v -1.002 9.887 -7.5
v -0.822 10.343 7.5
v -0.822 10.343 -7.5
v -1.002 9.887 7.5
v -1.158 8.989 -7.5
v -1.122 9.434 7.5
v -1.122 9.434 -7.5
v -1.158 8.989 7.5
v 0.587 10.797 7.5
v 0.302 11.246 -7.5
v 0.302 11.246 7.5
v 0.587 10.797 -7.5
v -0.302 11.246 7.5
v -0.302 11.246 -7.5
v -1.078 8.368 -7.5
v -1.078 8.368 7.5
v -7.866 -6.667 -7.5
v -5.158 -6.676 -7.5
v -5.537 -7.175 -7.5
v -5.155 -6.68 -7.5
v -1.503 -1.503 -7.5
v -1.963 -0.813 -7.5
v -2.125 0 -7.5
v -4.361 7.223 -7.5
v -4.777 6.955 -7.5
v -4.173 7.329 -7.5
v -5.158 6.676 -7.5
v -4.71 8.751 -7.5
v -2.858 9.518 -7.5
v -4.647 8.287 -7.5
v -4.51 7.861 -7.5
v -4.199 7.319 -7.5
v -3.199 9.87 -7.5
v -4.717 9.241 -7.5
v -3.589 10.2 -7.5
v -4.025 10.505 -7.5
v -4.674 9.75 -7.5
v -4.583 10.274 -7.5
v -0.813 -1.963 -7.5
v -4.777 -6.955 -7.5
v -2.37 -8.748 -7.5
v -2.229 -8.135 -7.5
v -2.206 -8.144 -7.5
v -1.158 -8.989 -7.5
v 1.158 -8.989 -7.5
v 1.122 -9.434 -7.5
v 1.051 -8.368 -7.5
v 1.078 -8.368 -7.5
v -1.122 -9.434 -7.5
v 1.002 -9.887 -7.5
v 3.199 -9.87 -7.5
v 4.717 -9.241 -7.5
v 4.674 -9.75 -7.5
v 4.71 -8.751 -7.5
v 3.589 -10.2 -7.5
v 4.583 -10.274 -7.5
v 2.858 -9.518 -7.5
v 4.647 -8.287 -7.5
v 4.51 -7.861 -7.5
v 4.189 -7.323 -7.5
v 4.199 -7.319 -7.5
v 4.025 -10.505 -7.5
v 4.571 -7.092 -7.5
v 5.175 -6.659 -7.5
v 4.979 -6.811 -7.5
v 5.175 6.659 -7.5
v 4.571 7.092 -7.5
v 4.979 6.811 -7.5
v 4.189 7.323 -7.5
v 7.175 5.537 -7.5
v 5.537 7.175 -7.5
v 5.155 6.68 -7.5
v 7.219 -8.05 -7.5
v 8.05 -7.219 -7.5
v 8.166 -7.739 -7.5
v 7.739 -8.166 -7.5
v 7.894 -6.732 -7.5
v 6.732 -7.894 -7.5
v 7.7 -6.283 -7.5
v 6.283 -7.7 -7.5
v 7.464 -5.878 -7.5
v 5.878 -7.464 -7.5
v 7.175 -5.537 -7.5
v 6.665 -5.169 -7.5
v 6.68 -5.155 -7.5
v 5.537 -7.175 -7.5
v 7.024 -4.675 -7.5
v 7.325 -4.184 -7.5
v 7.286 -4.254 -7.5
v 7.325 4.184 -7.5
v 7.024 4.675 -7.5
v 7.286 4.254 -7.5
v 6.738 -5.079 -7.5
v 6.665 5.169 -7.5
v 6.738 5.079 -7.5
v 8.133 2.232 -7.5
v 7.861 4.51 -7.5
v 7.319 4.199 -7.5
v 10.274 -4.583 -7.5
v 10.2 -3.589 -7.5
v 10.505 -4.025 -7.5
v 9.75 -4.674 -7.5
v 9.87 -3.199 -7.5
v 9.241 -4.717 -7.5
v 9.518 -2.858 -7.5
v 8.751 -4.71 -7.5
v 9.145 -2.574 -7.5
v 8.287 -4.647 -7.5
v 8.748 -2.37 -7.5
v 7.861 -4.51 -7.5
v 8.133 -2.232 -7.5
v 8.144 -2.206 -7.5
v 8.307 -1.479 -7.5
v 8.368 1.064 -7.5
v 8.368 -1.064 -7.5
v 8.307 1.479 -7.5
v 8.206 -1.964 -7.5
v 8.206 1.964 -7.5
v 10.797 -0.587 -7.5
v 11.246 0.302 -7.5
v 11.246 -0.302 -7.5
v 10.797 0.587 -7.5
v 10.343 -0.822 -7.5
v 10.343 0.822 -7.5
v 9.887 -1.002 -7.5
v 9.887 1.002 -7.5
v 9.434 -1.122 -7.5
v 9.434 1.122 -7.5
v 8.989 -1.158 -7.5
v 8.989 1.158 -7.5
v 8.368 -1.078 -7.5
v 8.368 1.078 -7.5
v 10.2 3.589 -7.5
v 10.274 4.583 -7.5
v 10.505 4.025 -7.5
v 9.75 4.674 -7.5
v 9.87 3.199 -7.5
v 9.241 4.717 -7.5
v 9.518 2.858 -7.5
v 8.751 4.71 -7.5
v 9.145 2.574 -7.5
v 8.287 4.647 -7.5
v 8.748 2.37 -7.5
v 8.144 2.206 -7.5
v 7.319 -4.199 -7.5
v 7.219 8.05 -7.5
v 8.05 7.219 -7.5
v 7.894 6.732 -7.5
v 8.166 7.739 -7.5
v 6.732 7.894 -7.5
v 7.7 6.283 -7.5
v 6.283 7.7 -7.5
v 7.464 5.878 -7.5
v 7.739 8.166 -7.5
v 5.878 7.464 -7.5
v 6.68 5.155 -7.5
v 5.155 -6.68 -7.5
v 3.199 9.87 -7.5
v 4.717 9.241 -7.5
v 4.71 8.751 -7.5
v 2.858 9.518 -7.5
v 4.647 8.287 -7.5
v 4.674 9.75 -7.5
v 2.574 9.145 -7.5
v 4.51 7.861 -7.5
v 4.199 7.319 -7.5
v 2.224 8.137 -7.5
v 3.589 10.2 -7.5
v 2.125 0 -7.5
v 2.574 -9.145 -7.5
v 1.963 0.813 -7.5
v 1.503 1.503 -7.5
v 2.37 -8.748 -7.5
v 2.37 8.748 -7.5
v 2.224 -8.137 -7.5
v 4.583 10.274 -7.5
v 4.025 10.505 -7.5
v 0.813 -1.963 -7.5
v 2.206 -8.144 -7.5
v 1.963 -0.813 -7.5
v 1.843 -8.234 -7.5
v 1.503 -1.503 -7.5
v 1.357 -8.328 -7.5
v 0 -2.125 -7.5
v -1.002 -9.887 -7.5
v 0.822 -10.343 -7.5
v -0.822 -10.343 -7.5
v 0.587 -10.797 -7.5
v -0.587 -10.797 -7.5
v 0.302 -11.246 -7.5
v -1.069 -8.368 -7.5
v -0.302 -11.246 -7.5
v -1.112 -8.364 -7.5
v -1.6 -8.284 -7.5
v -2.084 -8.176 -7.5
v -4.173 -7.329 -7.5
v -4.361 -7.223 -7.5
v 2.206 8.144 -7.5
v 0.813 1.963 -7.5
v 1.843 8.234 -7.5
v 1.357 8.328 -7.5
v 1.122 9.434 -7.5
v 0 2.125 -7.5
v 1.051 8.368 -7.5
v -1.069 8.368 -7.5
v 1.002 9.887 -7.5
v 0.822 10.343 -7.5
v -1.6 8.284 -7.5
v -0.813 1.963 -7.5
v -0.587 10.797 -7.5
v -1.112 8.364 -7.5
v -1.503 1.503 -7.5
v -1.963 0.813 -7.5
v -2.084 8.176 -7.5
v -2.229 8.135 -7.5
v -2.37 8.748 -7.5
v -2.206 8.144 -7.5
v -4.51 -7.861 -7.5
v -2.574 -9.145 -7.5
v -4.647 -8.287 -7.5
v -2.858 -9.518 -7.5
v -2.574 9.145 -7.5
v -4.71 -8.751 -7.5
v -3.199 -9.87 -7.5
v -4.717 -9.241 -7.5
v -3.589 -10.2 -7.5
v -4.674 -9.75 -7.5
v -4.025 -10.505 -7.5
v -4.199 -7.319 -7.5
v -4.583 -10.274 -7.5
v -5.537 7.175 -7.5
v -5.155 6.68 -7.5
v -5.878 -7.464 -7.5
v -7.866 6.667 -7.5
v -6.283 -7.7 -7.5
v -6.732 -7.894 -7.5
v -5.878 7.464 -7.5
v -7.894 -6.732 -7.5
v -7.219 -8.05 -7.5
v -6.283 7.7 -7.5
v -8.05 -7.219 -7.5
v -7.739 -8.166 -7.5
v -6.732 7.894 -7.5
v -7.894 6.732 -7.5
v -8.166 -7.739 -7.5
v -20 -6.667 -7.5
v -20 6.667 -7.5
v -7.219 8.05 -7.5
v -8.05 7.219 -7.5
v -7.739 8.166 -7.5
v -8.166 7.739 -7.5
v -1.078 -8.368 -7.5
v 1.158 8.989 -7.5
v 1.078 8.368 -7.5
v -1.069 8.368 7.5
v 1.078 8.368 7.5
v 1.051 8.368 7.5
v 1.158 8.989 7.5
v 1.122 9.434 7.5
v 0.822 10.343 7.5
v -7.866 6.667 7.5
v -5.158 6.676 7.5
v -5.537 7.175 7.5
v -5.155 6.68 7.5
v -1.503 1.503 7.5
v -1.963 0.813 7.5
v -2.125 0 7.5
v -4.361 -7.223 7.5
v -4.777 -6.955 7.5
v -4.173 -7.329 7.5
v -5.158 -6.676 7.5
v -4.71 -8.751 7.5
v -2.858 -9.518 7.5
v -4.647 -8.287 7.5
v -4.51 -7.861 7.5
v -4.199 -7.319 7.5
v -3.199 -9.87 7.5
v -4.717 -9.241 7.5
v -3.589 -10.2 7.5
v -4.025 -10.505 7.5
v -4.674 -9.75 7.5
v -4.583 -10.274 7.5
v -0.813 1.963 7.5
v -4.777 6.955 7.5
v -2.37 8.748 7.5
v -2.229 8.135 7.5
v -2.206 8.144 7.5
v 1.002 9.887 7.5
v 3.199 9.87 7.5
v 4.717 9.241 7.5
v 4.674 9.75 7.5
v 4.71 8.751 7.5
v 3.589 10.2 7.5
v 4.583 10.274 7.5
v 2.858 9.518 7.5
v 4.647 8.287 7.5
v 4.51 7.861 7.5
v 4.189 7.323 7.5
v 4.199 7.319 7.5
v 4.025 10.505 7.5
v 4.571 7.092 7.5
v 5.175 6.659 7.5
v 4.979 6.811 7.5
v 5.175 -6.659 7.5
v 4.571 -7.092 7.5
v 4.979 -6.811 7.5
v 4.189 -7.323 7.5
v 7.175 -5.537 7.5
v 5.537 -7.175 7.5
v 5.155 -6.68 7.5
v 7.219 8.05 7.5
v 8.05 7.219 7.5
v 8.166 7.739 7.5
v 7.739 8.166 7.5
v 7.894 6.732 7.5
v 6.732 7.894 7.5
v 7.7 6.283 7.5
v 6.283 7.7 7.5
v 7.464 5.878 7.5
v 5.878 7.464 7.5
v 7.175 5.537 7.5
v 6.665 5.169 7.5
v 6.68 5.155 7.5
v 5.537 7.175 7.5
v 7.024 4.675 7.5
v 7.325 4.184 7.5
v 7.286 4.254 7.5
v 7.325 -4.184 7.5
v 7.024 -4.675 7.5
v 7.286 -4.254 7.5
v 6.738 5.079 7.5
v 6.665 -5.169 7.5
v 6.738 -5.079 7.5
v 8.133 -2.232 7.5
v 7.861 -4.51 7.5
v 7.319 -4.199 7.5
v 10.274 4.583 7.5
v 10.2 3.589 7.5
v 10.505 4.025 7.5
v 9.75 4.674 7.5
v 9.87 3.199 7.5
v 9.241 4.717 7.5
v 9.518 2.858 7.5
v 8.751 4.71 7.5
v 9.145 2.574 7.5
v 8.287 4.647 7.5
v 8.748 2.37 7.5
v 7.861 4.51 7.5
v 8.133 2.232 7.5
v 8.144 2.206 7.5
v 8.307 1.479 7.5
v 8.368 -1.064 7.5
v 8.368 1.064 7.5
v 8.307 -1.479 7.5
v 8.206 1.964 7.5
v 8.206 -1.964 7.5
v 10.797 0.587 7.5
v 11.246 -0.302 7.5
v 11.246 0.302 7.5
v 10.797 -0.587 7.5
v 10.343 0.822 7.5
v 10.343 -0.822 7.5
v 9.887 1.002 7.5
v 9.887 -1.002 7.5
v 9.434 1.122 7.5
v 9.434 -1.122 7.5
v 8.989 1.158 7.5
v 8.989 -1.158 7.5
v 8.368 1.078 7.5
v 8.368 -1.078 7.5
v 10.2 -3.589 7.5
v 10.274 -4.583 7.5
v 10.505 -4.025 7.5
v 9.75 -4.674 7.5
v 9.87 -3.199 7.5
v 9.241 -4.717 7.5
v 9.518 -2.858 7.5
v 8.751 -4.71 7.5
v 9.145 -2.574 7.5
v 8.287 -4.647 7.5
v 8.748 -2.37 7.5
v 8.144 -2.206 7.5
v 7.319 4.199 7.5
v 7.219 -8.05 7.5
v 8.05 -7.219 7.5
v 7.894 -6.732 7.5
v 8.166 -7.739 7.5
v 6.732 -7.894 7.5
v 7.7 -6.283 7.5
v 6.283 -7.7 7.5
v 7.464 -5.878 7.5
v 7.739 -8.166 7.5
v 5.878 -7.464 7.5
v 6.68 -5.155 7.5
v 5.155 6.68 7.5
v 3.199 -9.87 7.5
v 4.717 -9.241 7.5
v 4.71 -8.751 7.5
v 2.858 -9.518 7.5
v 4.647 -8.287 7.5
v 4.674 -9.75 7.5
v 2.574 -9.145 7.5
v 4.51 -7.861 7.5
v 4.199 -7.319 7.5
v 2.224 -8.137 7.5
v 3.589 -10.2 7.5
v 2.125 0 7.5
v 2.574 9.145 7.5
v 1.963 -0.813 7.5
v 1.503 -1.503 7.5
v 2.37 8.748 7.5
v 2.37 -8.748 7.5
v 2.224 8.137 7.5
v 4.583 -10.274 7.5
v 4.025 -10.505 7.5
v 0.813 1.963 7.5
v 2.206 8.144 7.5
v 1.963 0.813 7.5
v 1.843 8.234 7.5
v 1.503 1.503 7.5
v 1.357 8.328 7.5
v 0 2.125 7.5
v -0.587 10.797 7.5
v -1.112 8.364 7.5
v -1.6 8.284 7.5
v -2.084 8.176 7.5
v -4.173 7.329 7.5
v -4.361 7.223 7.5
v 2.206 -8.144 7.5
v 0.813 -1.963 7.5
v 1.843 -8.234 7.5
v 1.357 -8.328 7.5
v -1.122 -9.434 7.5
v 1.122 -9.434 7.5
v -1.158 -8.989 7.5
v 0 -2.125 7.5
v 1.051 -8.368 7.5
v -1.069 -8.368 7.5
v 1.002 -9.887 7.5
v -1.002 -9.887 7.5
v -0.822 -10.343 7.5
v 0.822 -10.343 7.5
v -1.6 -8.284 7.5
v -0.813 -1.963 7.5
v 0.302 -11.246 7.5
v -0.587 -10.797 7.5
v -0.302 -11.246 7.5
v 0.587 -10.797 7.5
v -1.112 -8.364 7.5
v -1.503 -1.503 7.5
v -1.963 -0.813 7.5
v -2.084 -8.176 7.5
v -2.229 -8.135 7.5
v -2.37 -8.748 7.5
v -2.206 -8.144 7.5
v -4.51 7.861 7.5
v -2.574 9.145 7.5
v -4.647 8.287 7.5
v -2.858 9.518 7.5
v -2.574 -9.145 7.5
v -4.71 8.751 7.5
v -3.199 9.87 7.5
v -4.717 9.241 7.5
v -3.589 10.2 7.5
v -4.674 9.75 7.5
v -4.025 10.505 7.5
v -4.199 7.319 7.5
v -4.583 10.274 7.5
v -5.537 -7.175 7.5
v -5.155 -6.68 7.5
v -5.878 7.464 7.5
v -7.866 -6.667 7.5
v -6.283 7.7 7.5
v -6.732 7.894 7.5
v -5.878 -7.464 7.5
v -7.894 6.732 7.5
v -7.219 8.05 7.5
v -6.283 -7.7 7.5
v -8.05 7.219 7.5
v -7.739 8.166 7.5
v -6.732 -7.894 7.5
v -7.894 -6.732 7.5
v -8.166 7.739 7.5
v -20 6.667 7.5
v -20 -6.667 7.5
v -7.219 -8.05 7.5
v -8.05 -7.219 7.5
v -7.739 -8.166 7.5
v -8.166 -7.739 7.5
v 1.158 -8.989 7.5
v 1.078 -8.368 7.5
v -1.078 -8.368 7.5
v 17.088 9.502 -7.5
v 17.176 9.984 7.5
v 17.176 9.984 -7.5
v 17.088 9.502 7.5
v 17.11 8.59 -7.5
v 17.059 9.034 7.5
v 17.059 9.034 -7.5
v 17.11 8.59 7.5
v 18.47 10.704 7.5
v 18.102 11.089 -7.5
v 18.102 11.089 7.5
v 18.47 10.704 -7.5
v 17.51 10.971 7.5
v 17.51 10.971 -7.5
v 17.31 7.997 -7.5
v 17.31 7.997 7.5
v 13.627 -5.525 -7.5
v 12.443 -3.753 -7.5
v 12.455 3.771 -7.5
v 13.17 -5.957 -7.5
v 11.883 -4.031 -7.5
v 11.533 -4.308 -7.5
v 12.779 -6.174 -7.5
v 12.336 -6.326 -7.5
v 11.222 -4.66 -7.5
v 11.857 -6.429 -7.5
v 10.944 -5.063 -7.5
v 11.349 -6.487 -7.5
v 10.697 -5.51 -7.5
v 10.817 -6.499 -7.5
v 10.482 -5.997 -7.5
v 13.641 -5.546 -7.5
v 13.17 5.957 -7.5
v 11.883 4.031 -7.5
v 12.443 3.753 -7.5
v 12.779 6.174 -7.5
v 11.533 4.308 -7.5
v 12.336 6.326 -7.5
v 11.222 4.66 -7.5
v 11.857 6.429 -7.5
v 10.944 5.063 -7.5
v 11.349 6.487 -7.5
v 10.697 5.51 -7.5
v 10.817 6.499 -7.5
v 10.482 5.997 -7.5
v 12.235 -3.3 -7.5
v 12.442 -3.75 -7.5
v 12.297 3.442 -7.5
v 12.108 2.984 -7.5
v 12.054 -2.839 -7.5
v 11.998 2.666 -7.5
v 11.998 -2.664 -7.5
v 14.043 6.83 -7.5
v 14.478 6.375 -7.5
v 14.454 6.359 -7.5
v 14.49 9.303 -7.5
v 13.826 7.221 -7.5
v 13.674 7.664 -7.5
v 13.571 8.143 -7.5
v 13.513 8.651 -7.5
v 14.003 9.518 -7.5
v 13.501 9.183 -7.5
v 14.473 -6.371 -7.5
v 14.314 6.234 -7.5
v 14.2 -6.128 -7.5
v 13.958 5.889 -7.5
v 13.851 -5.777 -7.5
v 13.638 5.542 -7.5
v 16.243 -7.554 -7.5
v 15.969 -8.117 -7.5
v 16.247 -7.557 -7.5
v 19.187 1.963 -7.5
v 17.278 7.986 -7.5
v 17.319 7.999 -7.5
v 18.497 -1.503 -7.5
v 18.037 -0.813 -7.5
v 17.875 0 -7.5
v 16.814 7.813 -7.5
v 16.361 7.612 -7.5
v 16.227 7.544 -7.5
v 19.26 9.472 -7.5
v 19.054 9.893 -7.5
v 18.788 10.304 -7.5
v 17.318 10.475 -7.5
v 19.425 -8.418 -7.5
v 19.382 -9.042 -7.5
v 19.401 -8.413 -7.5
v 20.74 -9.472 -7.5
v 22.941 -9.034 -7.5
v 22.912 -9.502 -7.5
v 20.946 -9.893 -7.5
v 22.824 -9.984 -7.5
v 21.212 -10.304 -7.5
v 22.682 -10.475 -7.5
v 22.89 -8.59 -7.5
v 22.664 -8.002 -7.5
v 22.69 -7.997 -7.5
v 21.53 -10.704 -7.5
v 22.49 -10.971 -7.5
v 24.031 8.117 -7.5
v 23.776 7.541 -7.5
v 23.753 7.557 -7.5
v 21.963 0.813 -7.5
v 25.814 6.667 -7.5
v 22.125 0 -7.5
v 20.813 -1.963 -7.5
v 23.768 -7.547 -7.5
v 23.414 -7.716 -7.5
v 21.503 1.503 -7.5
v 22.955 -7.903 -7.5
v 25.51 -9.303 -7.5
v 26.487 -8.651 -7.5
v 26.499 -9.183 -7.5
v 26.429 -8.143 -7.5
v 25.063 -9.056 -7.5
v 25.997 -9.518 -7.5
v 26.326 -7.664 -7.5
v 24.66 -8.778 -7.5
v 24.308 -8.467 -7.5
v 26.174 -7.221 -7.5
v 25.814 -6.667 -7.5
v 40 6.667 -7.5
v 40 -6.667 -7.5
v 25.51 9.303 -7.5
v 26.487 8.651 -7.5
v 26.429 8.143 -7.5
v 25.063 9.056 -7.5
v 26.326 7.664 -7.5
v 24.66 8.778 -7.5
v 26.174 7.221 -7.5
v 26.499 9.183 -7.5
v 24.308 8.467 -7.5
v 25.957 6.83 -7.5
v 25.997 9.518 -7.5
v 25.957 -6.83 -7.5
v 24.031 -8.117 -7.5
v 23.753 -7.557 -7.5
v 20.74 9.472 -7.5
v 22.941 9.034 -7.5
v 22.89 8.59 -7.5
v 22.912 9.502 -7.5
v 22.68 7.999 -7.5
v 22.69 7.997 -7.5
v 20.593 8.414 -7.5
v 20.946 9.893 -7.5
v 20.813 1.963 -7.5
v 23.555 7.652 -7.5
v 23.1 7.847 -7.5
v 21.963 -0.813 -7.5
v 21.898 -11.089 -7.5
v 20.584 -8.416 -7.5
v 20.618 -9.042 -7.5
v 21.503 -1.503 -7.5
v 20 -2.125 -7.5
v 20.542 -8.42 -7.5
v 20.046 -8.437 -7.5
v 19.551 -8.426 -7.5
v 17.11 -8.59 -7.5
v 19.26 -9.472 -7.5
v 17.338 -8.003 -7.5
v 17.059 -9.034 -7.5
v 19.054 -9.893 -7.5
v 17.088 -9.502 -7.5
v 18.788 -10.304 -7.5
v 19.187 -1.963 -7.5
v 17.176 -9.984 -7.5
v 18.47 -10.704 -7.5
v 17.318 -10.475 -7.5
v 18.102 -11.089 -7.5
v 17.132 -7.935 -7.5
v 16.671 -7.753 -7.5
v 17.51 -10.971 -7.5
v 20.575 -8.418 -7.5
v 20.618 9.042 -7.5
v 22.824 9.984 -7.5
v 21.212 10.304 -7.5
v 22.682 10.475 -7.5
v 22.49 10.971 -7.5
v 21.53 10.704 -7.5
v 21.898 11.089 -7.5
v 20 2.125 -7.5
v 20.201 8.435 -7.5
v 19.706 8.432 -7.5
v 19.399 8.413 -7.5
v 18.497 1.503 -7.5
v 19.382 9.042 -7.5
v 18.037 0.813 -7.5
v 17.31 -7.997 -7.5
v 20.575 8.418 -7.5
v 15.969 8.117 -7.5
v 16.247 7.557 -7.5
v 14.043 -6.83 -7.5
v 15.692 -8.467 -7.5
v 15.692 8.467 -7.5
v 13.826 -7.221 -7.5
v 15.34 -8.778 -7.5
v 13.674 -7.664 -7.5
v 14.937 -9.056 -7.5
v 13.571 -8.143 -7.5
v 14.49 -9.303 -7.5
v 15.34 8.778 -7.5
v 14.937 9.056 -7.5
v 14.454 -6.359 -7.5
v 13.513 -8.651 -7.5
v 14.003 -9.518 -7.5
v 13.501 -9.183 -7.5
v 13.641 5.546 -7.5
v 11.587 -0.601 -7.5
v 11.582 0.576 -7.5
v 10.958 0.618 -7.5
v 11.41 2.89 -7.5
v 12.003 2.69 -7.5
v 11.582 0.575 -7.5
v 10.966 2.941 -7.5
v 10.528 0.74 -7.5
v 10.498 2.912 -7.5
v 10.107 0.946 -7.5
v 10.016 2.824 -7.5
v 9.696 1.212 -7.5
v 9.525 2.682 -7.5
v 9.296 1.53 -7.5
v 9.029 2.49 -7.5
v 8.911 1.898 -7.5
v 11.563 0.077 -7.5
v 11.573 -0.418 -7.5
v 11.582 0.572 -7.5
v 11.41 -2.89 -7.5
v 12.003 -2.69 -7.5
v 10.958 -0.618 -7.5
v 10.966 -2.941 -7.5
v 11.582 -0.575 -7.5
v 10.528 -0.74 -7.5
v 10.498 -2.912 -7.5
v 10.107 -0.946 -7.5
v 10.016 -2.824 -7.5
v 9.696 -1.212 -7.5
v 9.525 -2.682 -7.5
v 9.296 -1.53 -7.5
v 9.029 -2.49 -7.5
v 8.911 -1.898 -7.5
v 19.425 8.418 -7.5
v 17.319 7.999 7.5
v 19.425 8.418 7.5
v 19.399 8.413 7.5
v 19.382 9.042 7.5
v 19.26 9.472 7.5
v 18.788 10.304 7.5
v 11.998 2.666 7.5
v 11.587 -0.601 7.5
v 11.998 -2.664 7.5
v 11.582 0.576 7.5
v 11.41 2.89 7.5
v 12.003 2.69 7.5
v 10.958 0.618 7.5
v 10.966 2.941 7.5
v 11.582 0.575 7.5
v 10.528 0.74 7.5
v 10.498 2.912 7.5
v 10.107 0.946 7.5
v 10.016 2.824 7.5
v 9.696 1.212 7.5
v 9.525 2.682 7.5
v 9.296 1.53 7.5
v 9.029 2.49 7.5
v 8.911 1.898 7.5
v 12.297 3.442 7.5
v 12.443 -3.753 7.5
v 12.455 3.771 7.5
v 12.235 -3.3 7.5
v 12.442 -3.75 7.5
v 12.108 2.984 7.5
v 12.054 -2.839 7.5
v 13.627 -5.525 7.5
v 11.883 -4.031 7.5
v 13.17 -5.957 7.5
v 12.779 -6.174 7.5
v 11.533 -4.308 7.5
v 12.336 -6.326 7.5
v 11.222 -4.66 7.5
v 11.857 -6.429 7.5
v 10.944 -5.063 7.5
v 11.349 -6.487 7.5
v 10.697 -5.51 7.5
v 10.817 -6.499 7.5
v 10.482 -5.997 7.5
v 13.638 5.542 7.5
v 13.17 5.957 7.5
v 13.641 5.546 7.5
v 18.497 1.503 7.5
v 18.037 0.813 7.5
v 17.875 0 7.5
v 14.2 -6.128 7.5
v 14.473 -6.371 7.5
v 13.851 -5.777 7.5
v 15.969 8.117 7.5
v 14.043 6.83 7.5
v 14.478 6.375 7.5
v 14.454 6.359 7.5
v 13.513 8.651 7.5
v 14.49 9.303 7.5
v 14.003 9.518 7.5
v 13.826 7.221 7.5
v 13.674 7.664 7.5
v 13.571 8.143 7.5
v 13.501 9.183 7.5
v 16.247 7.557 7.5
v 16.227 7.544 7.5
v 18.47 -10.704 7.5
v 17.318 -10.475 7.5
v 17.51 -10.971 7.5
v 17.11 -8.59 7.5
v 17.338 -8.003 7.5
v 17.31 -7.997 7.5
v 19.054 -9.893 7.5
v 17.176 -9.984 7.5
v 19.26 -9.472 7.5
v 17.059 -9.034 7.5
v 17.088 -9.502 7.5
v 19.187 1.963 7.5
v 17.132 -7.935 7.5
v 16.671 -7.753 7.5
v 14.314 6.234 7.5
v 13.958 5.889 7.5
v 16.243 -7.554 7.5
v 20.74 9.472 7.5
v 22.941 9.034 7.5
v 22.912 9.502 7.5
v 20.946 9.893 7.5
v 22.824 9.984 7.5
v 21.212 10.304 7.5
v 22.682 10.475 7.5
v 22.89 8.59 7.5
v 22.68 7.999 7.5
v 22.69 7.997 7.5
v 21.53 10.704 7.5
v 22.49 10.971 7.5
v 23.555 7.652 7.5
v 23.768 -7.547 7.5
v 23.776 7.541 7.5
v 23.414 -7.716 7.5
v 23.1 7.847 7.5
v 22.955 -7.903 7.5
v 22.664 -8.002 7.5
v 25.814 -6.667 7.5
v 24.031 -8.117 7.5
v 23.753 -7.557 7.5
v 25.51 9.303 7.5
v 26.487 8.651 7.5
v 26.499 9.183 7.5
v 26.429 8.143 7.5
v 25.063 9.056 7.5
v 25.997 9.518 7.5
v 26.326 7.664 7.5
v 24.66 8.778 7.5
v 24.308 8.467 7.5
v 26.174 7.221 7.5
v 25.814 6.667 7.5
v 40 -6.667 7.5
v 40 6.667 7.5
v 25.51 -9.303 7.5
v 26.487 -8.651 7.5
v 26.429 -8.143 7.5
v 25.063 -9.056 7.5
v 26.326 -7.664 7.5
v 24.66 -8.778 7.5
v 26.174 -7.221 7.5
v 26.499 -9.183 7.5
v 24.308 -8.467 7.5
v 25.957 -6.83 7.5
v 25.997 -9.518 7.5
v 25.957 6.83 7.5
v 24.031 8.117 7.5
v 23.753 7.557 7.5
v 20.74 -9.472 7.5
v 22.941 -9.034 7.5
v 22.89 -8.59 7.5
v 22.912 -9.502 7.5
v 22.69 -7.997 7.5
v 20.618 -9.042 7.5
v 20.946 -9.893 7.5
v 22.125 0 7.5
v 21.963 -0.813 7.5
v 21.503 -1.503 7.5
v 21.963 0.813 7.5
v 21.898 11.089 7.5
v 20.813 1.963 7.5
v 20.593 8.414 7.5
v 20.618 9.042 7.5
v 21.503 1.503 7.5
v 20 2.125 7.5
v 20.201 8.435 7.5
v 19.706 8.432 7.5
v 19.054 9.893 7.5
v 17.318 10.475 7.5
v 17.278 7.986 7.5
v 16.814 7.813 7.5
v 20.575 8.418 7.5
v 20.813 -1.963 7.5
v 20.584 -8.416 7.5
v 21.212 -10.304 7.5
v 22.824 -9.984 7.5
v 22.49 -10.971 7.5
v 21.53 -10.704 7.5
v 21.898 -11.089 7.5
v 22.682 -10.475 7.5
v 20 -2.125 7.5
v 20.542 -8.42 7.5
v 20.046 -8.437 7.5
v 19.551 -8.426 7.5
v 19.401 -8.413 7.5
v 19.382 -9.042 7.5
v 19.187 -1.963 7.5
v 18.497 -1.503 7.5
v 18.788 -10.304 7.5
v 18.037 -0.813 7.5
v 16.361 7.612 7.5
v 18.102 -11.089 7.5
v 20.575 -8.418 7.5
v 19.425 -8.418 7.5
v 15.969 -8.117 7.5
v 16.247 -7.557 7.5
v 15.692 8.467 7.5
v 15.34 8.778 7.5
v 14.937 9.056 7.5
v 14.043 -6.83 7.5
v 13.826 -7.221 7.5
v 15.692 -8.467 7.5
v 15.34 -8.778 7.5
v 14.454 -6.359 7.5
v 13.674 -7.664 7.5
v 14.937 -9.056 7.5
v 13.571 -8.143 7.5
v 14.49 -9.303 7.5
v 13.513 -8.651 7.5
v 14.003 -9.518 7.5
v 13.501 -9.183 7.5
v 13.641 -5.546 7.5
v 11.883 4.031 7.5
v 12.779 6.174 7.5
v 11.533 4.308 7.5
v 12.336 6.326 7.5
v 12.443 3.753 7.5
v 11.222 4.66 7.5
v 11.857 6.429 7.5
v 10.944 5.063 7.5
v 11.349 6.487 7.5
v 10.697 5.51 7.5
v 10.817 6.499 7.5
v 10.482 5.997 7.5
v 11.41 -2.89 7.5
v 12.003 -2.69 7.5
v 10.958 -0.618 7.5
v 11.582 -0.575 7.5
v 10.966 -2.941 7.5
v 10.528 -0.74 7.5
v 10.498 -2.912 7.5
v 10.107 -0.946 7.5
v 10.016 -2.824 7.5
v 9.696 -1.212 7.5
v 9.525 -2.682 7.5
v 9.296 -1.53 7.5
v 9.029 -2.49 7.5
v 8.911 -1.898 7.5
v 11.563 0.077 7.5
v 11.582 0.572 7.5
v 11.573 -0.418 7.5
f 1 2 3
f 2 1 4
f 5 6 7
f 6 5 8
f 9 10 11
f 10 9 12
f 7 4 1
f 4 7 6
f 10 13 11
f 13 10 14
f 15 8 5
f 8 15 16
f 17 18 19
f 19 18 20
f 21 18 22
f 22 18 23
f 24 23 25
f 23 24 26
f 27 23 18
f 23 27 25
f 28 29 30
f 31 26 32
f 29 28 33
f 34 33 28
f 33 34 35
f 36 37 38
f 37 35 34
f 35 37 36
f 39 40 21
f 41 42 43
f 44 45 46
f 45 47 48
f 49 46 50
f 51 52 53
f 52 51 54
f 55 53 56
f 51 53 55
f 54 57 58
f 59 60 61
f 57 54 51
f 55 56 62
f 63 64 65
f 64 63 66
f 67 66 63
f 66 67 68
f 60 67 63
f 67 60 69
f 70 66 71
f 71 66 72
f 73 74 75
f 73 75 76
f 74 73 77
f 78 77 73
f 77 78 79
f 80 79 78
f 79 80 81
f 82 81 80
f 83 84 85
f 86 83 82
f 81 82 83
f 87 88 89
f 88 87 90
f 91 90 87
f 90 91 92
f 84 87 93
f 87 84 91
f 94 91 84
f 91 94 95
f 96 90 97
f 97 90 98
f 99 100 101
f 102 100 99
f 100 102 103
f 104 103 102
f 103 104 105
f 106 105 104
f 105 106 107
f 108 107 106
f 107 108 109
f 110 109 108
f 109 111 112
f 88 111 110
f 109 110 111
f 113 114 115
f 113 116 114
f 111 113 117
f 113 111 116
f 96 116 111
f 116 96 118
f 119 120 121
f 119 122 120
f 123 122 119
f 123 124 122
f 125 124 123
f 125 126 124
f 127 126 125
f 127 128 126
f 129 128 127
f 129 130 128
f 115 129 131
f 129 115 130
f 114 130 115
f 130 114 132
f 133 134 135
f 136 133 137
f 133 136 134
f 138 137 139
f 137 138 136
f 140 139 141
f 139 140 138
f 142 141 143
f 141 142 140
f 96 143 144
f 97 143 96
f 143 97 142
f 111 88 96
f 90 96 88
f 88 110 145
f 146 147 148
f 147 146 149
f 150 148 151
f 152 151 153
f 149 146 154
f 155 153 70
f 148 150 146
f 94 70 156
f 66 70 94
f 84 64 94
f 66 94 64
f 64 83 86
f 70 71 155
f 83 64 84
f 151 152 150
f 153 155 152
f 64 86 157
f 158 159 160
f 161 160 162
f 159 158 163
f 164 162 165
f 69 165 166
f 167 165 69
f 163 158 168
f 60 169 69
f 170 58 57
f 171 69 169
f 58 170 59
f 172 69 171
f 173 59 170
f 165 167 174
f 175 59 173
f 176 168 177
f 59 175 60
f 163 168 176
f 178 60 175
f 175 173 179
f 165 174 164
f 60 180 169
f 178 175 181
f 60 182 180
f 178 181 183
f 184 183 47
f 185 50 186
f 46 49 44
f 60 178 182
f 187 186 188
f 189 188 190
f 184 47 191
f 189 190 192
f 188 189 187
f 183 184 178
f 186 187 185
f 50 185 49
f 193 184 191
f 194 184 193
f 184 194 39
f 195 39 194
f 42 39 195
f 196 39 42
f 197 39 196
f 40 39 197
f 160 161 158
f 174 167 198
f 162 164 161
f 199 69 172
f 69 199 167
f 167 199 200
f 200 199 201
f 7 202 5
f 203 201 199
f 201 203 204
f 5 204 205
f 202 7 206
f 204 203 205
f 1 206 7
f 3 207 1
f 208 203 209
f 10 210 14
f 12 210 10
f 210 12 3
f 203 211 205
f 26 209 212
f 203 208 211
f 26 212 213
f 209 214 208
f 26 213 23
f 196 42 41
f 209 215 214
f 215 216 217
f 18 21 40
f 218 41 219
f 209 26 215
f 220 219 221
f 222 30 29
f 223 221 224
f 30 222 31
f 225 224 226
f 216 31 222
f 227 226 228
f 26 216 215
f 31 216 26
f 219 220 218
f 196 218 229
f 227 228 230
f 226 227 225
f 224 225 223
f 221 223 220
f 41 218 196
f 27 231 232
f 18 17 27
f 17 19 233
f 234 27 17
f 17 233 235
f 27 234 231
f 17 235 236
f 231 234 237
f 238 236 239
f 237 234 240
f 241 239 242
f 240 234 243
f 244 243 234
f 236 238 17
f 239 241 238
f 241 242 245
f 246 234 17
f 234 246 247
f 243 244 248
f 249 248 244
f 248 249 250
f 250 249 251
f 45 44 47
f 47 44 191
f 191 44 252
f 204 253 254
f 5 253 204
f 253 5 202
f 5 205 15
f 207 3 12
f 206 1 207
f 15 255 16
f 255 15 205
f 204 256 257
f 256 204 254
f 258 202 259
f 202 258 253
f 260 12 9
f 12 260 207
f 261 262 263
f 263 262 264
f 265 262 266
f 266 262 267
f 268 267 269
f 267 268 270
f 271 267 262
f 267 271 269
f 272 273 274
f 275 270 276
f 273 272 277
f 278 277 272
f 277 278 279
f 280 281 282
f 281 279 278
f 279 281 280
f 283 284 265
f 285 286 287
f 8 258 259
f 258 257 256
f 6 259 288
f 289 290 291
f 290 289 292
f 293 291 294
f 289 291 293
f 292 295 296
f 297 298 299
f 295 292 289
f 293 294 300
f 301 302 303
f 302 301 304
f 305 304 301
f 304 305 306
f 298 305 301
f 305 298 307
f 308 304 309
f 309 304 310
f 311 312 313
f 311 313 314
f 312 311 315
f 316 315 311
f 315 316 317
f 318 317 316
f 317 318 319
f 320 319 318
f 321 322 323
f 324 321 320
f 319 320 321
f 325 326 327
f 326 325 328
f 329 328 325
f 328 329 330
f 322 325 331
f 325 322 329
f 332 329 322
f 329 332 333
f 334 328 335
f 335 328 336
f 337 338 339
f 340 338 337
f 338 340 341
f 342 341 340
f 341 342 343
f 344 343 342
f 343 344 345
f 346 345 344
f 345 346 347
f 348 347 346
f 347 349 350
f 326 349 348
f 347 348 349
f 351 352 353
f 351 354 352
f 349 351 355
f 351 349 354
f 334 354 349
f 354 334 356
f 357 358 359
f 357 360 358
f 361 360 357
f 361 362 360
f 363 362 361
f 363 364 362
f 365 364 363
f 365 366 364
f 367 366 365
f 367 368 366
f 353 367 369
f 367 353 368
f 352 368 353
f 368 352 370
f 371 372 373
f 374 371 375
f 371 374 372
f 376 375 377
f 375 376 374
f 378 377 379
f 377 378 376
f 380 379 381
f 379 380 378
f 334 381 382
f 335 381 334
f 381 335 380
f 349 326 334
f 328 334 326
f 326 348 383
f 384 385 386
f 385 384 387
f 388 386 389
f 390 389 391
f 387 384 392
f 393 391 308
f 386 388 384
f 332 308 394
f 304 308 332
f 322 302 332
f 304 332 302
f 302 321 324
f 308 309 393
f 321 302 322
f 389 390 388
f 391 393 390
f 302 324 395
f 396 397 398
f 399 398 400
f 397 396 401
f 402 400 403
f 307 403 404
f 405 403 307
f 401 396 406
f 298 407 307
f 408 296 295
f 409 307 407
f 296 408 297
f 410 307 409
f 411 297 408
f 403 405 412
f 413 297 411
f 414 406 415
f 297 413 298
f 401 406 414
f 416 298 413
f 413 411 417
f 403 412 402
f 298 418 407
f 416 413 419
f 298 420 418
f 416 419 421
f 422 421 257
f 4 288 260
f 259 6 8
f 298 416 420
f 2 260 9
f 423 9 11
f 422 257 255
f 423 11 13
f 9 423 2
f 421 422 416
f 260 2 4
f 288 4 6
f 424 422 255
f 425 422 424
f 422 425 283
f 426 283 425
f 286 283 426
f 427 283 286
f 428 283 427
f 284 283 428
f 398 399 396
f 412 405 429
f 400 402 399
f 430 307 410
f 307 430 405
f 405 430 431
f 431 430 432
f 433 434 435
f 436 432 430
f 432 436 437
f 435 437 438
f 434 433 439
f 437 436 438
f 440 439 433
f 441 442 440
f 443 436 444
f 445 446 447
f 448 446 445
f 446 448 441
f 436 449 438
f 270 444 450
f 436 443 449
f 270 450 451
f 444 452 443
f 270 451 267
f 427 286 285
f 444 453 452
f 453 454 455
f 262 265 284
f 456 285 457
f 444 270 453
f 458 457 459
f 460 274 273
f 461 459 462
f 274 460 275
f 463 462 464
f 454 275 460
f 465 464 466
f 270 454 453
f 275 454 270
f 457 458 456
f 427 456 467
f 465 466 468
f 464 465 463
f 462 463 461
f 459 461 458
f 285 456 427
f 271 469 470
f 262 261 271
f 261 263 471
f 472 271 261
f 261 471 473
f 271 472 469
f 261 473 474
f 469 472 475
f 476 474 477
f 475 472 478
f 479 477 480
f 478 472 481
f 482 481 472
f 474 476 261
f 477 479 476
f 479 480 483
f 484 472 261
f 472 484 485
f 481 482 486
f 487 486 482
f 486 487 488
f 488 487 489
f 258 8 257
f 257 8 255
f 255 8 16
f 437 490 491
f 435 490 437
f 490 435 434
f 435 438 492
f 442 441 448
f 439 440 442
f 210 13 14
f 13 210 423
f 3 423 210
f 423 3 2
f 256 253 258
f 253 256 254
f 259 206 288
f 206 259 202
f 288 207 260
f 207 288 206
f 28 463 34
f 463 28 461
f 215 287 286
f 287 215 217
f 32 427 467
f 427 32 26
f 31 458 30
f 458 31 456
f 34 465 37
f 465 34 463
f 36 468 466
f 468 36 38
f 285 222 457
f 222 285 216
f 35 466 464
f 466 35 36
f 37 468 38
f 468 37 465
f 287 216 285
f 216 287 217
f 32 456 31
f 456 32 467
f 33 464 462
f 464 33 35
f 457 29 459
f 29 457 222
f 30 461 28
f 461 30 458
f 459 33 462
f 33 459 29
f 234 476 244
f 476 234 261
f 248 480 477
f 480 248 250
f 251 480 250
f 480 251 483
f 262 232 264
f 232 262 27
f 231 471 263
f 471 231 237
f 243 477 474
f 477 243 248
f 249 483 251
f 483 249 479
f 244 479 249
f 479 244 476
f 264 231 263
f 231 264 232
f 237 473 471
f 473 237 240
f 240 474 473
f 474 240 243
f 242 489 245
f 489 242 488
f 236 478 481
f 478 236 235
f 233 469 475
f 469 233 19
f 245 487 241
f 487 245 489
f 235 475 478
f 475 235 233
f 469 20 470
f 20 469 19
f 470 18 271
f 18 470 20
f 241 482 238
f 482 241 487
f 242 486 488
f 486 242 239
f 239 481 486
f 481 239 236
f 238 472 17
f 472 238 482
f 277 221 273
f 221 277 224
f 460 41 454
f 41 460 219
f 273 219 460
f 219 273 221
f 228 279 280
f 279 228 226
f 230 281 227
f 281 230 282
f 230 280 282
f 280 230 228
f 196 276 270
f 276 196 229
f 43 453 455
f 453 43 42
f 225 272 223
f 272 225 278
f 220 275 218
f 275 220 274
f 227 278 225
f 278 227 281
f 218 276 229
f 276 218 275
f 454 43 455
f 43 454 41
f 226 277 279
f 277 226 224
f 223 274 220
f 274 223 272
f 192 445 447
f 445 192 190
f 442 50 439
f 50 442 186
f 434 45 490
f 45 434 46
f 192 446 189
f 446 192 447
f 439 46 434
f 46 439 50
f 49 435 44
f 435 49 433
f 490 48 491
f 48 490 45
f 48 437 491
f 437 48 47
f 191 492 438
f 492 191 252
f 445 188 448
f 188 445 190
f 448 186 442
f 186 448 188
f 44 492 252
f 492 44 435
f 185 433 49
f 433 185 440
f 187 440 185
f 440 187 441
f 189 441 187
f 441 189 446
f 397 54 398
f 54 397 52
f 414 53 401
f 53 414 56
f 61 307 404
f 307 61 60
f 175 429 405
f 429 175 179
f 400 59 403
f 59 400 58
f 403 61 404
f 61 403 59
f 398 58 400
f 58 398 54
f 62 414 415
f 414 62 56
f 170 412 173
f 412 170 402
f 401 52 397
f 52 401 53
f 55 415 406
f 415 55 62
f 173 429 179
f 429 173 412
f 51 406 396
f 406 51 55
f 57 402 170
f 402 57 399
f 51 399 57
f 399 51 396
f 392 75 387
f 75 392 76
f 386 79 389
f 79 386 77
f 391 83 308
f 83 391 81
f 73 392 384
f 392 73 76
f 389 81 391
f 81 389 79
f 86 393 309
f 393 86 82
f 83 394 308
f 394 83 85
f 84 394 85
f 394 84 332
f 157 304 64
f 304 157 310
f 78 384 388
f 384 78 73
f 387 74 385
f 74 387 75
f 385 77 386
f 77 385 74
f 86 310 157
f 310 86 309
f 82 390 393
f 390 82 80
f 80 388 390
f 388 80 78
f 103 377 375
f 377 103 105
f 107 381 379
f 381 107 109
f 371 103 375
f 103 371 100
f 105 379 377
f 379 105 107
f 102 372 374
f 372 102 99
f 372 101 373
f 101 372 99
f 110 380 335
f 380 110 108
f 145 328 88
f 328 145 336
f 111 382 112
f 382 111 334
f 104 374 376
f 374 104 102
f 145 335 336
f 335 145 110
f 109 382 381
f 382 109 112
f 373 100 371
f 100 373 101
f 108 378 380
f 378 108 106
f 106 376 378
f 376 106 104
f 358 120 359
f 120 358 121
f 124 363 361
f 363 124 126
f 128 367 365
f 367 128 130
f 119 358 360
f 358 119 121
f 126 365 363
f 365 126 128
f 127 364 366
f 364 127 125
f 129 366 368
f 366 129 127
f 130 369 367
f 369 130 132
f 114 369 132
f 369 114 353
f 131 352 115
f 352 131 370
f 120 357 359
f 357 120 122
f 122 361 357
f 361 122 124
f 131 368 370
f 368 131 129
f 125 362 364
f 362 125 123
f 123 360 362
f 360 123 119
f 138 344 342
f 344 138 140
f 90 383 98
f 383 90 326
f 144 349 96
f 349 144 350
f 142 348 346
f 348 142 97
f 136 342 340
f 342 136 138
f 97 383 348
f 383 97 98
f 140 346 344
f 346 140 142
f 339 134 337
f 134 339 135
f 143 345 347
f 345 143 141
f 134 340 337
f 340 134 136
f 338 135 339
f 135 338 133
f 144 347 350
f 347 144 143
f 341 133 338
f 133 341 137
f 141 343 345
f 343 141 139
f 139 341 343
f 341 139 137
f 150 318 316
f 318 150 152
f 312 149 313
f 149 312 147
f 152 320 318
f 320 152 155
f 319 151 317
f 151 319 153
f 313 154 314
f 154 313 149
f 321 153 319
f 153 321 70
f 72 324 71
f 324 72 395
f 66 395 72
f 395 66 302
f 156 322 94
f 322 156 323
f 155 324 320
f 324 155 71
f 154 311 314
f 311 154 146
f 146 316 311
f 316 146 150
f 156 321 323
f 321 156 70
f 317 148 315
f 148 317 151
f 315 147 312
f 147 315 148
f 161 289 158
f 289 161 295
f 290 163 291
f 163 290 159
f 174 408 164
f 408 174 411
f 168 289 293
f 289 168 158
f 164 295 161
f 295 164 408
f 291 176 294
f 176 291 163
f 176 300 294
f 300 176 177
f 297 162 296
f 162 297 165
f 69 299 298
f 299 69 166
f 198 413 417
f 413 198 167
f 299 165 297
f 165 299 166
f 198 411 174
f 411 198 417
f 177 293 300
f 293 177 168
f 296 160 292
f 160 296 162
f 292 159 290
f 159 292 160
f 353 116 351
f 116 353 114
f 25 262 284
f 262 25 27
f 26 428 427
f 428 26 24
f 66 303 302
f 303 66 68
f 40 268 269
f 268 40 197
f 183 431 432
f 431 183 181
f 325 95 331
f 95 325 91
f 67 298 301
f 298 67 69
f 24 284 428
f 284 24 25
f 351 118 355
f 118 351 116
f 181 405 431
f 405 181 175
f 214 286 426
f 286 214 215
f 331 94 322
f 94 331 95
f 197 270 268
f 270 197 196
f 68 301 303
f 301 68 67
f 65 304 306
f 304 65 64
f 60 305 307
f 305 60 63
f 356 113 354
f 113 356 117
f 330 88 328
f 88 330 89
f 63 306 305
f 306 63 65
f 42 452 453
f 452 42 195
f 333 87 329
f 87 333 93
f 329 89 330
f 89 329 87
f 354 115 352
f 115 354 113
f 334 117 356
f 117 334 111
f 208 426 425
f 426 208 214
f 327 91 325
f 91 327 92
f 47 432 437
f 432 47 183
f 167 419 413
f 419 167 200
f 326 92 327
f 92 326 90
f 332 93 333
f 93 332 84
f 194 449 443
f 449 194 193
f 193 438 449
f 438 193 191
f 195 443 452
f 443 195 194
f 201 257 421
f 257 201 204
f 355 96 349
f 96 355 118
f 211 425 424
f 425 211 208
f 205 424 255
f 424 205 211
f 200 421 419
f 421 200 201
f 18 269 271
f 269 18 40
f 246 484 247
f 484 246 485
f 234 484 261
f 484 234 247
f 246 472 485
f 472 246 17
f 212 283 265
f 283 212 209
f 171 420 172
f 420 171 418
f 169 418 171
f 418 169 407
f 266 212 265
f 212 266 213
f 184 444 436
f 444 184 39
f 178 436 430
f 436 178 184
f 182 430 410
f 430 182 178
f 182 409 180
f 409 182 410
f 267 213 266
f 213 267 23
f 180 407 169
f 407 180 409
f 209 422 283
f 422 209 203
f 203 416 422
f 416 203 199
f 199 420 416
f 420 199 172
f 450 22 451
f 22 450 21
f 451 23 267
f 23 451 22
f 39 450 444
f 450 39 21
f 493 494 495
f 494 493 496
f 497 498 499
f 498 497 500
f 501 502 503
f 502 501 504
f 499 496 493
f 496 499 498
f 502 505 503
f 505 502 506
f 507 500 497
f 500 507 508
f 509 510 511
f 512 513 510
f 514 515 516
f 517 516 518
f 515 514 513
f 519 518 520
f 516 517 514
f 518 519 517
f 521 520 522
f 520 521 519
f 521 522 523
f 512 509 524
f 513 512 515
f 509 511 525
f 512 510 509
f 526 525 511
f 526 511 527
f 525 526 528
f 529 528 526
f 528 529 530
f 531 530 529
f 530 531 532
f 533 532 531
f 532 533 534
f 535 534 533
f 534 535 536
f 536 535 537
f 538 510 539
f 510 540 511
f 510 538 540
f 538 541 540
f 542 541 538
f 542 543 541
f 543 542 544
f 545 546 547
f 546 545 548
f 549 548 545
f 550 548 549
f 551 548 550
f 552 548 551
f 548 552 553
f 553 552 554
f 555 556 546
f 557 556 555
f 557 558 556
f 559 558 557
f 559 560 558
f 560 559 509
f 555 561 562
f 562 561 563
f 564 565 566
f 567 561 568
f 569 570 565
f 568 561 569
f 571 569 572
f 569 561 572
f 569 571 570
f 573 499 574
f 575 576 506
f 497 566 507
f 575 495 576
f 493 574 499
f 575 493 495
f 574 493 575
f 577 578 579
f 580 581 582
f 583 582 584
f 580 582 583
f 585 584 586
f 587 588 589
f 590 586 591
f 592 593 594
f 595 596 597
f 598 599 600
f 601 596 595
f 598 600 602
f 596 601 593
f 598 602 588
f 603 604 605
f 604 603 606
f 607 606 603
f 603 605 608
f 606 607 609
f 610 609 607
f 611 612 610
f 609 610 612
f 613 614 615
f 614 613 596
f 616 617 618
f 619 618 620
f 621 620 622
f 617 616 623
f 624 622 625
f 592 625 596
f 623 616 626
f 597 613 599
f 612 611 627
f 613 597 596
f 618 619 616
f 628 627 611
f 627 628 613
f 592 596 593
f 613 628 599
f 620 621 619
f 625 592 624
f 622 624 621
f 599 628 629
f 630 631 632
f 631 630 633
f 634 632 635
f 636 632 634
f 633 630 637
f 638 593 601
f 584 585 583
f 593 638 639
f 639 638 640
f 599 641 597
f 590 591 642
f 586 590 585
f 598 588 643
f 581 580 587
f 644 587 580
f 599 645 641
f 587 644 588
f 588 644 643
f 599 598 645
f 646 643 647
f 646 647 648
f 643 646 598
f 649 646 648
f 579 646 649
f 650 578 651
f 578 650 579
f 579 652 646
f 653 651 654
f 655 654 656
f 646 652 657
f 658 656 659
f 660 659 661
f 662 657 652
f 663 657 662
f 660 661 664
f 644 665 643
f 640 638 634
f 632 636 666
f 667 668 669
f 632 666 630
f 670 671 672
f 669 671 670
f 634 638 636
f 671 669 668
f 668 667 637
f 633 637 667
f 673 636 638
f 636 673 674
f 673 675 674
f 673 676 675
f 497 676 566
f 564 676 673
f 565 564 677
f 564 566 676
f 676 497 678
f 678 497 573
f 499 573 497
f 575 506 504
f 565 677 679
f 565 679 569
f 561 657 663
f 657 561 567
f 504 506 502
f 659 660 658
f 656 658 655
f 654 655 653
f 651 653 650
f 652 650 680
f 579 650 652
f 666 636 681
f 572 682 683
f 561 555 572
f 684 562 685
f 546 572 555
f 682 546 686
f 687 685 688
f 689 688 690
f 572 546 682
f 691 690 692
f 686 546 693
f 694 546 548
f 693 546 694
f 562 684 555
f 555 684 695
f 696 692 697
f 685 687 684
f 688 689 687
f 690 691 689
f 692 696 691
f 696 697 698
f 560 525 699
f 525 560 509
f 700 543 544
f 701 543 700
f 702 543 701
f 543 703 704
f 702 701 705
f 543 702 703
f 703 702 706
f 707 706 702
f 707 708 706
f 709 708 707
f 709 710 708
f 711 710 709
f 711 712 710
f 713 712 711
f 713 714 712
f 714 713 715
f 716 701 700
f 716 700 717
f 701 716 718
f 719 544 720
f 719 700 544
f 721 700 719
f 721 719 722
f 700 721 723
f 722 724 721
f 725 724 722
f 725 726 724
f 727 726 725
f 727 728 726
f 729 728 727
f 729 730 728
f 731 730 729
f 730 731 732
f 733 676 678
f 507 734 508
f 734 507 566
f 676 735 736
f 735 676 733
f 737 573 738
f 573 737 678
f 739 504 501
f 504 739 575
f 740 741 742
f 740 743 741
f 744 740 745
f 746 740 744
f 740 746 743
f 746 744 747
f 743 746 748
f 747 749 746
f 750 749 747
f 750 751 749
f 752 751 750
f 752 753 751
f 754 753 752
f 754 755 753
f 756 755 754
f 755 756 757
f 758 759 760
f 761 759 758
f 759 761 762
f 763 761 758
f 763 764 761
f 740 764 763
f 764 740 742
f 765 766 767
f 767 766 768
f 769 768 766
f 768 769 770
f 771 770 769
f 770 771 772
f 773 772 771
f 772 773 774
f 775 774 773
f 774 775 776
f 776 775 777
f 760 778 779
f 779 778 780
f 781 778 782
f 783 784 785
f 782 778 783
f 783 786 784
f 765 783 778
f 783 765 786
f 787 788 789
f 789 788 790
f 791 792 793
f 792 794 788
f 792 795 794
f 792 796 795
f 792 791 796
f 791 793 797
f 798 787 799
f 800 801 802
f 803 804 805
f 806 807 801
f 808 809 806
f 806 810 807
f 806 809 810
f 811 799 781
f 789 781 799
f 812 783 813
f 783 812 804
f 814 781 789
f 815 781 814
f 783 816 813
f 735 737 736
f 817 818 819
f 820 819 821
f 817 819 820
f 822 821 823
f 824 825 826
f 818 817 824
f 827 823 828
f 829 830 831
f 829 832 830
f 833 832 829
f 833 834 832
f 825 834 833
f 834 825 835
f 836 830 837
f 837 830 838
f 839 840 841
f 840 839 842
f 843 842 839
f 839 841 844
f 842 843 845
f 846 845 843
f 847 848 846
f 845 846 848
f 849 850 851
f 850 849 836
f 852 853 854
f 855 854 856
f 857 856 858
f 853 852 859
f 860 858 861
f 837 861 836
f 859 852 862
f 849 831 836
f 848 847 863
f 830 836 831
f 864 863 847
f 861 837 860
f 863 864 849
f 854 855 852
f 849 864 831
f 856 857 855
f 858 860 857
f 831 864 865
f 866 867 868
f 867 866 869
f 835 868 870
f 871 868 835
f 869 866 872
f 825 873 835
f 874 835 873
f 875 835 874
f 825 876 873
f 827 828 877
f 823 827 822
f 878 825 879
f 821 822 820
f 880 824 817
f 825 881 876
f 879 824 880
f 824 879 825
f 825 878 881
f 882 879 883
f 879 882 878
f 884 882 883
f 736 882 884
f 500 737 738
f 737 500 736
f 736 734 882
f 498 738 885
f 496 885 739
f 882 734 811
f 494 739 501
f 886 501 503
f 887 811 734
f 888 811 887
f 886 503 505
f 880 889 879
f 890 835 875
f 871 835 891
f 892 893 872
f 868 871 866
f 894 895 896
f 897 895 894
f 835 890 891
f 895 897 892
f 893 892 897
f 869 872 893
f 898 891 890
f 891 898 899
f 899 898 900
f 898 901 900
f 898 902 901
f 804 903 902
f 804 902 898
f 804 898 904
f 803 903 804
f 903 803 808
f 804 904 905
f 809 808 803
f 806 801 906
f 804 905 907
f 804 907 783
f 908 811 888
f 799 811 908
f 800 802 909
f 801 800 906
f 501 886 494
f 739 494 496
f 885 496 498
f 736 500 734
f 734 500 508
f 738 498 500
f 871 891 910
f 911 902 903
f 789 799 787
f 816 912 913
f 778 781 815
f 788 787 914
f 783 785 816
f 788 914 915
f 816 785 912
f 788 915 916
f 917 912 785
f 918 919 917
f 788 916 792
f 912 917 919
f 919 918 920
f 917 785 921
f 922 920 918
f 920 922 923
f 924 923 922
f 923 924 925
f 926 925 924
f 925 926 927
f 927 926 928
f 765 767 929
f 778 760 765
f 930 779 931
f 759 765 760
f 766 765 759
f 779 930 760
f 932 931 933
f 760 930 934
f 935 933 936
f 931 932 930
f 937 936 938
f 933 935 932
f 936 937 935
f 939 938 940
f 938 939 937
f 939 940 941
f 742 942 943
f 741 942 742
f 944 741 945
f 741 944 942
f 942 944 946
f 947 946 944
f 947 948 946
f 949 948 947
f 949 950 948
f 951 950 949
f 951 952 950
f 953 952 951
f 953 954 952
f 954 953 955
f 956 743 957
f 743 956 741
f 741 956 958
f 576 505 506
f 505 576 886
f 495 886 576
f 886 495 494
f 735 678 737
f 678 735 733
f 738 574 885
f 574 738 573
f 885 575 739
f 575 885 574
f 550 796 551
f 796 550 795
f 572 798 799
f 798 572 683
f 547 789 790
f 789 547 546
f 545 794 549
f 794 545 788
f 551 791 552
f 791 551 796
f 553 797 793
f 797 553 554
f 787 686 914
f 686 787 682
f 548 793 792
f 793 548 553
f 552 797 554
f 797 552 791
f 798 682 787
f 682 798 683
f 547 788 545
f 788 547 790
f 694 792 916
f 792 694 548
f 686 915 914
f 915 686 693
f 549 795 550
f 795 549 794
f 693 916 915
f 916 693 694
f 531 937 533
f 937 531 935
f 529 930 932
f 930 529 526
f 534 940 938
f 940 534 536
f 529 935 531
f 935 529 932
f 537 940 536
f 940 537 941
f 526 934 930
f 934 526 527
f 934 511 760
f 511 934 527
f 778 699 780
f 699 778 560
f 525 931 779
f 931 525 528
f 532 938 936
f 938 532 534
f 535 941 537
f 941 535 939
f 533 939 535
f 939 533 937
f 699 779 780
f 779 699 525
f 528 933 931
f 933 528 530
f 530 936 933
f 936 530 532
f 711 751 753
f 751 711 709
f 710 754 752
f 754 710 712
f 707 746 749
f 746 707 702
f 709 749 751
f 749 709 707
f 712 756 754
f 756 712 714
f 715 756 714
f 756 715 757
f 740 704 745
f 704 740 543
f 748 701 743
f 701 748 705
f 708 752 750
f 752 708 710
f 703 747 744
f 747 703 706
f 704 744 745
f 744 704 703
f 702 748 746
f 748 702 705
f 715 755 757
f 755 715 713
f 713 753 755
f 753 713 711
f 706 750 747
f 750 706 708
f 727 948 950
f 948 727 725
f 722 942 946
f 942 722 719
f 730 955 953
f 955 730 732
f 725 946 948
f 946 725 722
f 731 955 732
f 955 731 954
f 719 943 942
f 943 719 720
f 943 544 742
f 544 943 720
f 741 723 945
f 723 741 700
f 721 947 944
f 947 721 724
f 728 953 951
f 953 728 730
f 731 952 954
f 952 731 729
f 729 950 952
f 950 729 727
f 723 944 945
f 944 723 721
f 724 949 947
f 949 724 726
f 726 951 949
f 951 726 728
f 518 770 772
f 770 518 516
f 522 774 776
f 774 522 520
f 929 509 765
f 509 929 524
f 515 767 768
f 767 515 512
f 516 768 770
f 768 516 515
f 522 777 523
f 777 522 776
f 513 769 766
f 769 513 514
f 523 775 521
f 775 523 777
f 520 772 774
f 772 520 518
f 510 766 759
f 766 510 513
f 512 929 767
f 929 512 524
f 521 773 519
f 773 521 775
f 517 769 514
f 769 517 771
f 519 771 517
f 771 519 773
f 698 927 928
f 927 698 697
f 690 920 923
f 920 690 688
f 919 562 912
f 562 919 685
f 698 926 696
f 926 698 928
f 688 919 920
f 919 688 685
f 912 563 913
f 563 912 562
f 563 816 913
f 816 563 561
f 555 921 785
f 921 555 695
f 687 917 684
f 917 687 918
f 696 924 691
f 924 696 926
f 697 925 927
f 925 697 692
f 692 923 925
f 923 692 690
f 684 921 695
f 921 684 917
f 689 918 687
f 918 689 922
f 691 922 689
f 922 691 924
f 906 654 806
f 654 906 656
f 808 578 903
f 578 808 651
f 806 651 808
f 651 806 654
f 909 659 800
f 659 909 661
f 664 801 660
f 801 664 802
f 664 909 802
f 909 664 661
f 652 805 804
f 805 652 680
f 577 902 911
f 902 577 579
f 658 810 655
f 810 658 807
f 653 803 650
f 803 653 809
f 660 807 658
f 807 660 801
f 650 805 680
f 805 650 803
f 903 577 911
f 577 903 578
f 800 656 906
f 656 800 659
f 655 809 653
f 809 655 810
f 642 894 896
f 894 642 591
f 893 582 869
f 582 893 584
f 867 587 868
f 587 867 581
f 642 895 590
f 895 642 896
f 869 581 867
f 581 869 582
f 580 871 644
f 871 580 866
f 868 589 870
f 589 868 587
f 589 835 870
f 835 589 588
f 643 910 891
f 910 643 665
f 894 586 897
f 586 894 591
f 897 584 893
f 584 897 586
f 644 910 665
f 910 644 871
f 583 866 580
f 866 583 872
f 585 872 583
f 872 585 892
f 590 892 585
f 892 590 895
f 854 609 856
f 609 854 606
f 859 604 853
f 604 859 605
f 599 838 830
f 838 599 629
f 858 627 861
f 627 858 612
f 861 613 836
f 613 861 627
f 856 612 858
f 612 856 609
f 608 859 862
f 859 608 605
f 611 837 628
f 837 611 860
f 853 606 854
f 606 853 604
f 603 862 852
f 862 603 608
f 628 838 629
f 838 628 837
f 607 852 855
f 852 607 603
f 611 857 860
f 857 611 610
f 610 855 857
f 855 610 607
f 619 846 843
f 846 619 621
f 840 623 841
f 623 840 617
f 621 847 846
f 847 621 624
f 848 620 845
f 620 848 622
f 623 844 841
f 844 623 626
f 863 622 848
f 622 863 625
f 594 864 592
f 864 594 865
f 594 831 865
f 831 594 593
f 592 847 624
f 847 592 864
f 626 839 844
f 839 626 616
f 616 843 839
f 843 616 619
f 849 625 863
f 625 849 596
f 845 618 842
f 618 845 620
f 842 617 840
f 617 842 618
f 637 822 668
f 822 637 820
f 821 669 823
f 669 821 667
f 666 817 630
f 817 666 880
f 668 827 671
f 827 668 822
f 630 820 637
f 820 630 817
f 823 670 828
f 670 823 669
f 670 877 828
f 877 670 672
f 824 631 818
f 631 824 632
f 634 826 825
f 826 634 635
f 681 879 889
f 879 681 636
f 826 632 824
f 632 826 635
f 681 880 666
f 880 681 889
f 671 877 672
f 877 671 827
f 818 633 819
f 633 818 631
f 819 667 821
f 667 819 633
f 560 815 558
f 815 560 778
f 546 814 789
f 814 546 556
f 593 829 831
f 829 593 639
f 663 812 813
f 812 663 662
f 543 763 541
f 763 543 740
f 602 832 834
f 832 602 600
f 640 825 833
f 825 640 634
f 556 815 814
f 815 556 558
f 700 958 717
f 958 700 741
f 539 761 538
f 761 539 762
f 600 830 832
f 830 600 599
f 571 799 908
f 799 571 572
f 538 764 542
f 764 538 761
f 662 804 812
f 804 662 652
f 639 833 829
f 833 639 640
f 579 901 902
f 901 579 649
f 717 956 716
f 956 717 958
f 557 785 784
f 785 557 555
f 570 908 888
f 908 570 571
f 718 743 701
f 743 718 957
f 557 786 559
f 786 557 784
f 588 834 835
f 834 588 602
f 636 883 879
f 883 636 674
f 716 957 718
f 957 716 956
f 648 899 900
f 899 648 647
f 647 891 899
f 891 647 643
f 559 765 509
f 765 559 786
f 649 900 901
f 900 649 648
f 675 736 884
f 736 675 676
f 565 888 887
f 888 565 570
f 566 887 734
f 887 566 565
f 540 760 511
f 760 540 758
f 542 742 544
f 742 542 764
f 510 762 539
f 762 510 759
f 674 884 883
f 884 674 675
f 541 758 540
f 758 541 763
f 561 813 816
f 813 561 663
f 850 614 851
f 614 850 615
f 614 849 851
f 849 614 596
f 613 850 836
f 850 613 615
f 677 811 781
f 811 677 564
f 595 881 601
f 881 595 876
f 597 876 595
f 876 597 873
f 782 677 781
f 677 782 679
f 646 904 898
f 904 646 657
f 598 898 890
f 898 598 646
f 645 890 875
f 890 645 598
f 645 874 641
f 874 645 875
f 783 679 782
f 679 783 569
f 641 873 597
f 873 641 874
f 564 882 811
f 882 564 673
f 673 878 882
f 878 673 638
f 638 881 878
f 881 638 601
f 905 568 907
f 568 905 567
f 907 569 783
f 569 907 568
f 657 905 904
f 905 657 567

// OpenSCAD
use <../lib/gear_spur.scad>


EPSILON = 0.05;

D = 20;
Z = 16;
m = D / Z;
H = 15;
GAP = 0.25;


module link() {
    translate([0, 0, GAP/2]) {
        linear_extrude(height=H-GAP) {
            import("geared_hinge.dxf", layer="link", $fn=64);
        }
    }
}

module link_1() {
    difference() {
        union() {
            translate([D/2, 0, 0]) external_gear_spur(m, Z, H-GAP);
            translate([-D/2, 0, 0]) cylinder(r=D/2, h=H-GAP, center=true, $fn=64);
            cube([D, D, H-GAP], center=true);
        }
        translate([D/2, 0, 0]) cylinder(r=4.25/2, h=H+2*EPSILON, center=true, $fn=16);
        translate([-D/2, 0, 0]) cylinder(r=4.25/2, h=H+2*EPSILON, center=true, $fn=16);
    }
}

module link_2() {
    difference() {
        union() {
            translate([D/2, 0, 0]) rotate([0, 0, 360/Z/2]) external_gear_spur(m, Z, H-GAP);
            translate([-D/2, 0, 0]) cylinder(r=D/2, h=H-GAP, center=true, $fn=64);
            cube([D-2, D, H-GAP], center=true);
        }
        translate([D/2, 0, 0]) cylinder(r=4.25/2, h=H+2*EPSILON, center=true, $fn=16);
        translate([-D/2, 0, 0]) cylinder(r=4.25/2, h=H+2*EPSILON, center=true, $fn=16);
    }
}

module link_3() {
    difference() {
        union() {
            translate([D/2, 0, 0]) rotate([0, 0, 360/Z/2]) external_gear_spur(m, Z, H-GAP);
            translate([-D/2, 0, 0]) external_gear_spur(m, Z, H-GAP);
            cube([D-2, D, H-GAP], center=true);
        }
        translate([D/2, 0, 0]) cylinder(r=4.25/2, h=H+2*EPSILON, center=true, $fn=16);
        translate([-D/2, 0, 0]) cylinder(r=4.25/2, h=H+2*EPSILON, center=true, $fn=16);
    }
}


module hinge_1() {
    difference() {
        union() {
            external_gear_spur(m, Z, H);
            translate([-D/2, 0, 0]) {
                cube([D, 2*D/3, H], center=true);
            }
        }
        cylinder(r=4.25/2, h=H+2*EPSILON, center=true, $fn=16);
    }
}


module hinge_2() {
    difference() {
        union() {
            rotate([0, 0, 360/Z/2]) {
                external_gear_spur(m, Z, H);
            }
            translate([D/2, 0, 0]) {
                cube([D, 2*D/3, H], center=true);
            }
        }
        cylinder(r=4.25/2, h=H+2*EPSILON, center=true, $fn=16);
    }
}


module hinge_3() {
    difference() {
        cube([D, 2*D/3, H], center=true);
        translate([D/2, 0, 0]) {
            cylinder(r=D/2+0.5, h=H+2*EPSILON, center=true, $fn=64);
        }
//      translate([-D/4, D/5, 0]) {
//          cylinder(r=3.25/2, h=H+2*EPSILON, center=true, $fn=16);
//      }
//      translate([-D/4, -D/5, 0]) {
//          cylinder(r=3.25/2, h=H+2*EPSILON, center=true, $fn=16);
//      }
    }
}


module hinge_complete_1() {
    hinge_1();
    translate([-D/2, 0, H]) {
        hinge_3();
    }
    translate([0, 0, 2*H]) {
        hinge_1();
    }
}


module hinge_complete_2() {
    hinge_2();
    translate([D/2, 0, H]) {
        rotate([0, 0, 180]) {
            hinge_3();
        }
    }
    translate([0, 0, 2*H]) {
        hinge_2();
    }
}


module display_1() {
    translate([ 0, 0, 0]) color("lightblue") hinge_1();
    translate([D, 0, 0]) color("lightgreen") hinge_2();
}


module display_2() {
    translate([0, 0, 0]) color("lightblue") hinge_1();
    translate([D*cos(45), D*sin(45), 0]) rotate([0, 0, 90]) color("lightgreen") hinge_2();
}


module display_3() {
    translate([0,  0, 0]) color("lightblue") hinge_1();
    translate([0, D, 0]) rotate([0, 0, 180]) color("lightgreen") hinge_2();
}


module display_complete_1() {
    translate([ 0, 0, 0]) color("lightblue") hinge_complete_1();
    translate([10, 0, H/2]) link();
    translate([2D, 0, 0]) color("lightgreen") hinge_complete_2();
}


module display_complete_2() {
    translate([0, 0, 0]) color("lightblue") hinge_complete_1();
    rotate([0, 0, 45]) translate([10, 0, H/2]) link();
    translate([20*cos(45), 20*sin(45), 0]) rotate([0, 0, 90]) color("lightgreen") hinge_complete_2();
}


module display_complete_3() {
    translate([0,  0, 0]) color("lightblue") hinge_complete_1();
    rotate([0, 0, 90]) translate([10, 0, H/2]) link();
    translate([0, D, 0]) rotate([0, 0, 180]) color("lightgreen") hinge_complete_2();
}


module print_half_hinge_1() {
    hinge_1();
    translate([-D/2, 0, 2*H/3]) {
        difference() {
            hinge_3();
            translate([-D/2-100/2, 0, H/6]) {
                cube([100, 100, 100]);
            }
        }
    }
}


module print_half_hinge_2() {
    hinge_2();
    translate([D/2, 0, 2*H/3]) {
        difference() {
            rotate([0, 0, 180]) {
                hinge_3();
            }
            translate([D/2-100/2, 0, H/6]) {
                cube([100, 100, 100]);
            }
        }
    }
}


display_1();
//display_2();
//display_3();

//hinge_1();
//hinge_2();
//hinge_3();

//hinge_complete_1();
//hinge_complete_2();

//display_complete_1();
//translate([0, 2*D, 0]) rotate([0, 0, -45]) display_complete_2();
//translate([0, 4*D, 0]) rotate([0, 0, -90]) display_complete_3();

//print_half_hinge_1();
//print_half_hinge_2();
//link();
//link_1();
//link_2();
//link_3();

//print_half_hinge_1();
//print_half_hinge_2();
//link();
